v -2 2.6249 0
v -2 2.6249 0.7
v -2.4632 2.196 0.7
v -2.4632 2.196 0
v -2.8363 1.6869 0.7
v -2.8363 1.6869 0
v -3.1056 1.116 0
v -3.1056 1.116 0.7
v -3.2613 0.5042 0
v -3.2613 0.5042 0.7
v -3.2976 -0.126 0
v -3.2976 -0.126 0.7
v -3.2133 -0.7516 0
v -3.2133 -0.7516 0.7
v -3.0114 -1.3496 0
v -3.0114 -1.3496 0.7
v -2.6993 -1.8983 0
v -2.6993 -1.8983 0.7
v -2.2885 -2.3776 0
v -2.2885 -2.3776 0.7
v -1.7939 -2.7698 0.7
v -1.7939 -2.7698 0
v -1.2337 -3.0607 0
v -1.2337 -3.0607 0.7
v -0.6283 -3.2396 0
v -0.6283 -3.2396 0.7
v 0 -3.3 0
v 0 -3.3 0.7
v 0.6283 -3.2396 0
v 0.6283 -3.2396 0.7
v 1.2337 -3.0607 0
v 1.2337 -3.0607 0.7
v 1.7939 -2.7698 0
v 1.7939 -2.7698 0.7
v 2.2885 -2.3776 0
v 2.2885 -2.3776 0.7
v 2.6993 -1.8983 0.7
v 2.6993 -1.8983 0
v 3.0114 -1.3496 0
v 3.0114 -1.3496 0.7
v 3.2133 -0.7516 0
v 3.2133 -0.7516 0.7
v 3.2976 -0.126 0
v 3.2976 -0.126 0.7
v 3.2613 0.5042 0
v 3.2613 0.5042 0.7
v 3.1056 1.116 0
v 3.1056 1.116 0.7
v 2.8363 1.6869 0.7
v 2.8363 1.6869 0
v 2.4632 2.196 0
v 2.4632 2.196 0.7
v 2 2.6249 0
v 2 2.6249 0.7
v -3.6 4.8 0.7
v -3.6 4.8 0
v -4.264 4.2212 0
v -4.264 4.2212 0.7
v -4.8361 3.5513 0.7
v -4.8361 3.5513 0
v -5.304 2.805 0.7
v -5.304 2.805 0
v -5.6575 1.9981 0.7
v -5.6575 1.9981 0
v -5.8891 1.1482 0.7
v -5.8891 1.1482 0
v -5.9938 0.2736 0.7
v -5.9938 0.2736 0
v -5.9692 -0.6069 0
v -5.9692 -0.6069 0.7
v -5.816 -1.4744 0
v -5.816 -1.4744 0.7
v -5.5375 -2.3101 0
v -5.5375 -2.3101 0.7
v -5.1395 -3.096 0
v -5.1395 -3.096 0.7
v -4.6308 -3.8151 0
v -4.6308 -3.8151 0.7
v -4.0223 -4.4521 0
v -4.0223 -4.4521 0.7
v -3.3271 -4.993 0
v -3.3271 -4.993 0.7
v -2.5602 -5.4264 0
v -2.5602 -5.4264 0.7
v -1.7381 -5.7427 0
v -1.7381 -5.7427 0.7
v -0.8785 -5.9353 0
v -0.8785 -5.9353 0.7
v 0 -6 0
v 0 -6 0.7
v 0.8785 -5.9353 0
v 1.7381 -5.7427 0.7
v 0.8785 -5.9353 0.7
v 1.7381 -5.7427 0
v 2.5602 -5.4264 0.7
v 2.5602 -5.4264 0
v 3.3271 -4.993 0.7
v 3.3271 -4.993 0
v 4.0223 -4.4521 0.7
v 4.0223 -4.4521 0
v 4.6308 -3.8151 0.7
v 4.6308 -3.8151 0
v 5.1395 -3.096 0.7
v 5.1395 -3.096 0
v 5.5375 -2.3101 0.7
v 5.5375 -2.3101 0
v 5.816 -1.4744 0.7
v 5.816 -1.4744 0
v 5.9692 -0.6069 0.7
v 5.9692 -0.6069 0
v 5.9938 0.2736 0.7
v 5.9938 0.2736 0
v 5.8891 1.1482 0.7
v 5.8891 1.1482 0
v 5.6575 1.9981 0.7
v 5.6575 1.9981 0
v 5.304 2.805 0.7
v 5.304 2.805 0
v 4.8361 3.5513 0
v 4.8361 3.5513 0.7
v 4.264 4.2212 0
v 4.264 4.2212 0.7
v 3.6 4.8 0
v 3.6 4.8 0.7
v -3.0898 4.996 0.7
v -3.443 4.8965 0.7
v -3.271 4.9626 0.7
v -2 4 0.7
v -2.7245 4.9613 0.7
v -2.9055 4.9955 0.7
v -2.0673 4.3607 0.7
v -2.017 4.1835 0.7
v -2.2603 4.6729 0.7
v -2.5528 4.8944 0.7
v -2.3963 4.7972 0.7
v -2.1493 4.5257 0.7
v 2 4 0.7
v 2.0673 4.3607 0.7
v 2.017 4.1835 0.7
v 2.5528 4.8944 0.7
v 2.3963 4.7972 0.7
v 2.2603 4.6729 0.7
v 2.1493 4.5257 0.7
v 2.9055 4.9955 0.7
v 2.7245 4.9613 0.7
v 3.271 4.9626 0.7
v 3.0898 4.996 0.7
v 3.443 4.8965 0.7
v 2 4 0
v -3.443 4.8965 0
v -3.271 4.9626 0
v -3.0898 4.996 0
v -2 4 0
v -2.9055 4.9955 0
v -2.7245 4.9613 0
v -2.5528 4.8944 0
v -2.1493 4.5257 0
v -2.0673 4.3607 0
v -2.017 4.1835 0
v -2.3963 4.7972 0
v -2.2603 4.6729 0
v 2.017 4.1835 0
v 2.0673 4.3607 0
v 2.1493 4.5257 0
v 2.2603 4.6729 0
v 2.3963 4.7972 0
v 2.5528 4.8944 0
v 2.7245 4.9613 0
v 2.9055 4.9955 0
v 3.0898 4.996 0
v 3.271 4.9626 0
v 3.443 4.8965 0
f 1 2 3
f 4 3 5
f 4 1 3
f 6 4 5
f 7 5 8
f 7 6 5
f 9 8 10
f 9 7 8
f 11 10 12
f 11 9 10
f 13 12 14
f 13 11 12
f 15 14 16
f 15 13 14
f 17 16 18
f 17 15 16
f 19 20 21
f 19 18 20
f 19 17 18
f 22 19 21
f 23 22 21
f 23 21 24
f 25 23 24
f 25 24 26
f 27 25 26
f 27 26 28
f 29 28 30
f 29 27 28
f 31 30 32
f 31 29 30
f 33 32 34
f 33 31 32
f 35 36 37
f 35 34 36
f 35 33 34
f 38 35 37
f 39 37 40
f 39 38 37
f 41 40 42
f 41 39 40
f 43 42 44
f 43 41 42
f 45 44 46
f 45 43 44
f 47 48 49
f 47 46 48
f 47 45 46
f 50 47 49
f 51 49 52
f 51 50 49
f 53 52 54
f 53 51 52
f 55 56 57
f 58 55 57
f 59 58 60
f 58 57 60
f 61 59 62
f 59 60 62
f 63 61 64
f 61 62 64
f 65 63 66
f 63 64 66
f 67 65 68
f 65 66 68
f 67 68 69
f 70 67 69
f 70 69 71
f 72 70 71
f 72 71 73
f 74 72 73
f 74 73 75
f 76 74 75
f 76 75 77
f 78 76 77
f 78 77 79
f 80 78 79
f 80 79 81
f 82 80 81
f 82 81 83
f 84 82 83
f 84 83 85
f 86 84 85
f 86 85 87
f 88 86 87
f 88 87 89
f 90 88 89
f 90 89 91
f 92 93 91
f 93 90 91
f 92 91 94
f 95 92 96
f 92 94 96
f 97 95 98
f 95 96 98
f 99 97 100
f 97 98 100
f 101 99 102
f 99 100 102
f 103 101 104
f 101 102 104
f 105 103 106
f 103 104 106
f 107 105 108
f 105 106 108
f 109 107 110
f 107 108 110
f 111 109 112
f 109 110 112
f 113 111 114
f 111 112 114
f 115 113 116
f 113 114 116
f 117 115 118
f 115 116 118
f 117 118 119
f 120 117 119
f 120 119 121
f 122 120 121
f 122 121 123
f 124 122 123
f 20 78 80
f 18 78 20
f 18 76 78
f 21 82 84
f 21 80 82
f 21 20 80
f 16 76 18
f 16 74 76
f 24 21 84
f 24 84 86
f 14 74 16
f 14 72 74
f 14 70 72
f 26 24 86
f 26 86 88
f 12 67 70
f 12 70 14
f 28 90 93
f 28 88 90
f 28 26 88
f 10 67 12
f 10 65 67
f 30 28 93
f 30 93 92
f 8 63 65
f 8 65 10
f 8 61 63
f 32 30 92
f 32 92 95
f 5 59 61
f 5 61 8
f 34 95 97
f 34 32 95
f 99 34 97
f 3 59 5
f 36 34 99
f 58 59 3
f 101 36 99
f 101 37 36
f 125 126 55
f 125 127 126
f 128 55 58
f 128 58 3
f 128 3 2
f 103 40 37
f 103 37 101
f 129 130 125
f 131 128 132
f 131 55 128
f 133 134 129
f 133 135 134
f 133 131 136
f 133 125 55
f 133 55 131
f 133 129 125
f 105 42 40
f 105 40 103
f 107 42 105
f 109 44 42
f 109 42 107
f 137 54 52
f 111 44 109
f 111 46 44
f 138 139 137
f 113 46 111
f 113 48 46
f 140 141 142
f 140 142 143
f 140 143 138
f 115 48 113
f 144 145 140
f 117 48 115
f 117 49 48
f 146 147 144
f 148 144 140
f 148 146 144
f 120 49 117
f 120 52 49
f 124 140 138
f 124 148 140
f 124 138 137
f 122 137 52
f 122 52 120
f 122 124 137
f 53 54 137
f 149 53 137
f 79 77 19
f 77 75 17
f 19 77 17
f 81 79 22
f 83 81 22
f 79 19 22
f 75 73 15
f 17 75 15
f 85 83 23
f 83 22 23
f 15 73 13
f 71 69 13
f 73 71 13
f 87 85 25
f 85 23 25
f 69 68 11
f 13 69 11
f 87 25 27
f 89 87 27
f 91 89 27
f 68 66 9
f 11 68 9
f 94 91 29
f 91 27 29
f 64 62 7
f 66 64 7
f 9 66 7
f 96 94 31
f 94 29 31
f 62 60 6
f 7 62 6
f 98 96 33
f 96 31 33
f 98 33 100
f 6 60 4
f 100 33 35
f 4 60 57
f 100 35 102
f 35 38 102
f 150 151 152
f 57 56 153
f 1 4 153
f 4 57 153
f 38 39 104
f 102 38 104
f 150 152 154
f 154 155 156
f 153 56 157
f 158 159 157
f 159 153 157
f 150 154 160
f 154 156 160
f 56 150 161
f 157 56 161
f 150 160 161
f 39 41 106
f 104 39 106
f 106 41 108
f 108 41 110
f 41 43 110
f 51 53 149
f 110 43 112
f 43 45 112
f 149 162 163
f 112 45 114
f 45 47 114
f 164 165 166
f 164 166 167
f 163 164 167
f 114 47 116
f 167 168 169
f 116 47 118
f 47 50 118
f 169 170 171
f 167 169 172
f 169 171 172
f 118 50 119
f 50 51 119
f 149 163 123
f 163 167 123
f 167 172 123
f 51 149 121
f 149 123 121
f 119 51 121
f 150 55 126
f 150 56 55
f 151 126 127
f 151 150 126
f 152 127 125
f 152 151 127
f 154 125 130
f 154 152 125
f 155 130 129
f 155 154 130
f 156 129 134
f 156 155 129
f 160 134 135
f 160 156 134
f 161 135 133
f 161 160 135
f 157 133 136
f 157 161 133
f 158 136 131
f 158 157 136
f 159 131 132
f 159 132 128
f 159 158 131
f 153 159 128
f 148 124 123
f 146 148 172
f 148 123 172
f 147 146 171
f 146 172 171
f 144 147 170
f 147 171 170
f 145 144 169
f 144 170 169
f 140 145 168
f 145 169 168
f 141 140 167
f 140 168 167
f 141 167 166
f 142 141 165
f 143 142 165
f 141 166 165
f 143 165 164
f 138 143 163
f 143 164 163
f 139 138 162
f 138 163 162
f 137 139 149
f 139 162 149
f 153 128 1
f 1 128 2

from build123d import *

# Parameters (mm, degrees)
SKETCH1_R           = 6
SKETCH1_R_2         = 3.3
BOSS_EXTRUDE1_DEPTH = 0.7
CUT_EXTRUDE1_DEPTH  = 0.7
FILLET1_R           = 1


with BuildPart() as part:
    # Sketch1 → Boss-Extrude1 (new body)
    with BuildSketch(Plane.XY):
        Circle(SKETCH1_R)
        Circle(SKETCH1_R_2, mode=Mode.SUBTRACT)
    extrude(amount=BOSS_EXTRUDE1_DEPTH)

    # Sketch2 → Cut-Extrude1 (cut)
    with BuildSketch(Plane.XY.offset(0.7)):
        with BuildLine():
            Line((-2, 5.656854249), (-2, 2.62488095))
            Line((-2, 2.62488095), (2, 2.62488095))
            Line((2, 2.62488095), (2, 5.656854249))
            ThreePointArc((2, 5.656854249), (0, 7.656854249), (-2, 5.656854249))
        make_face()
    extrude(amount=-CUT_EXTRUDE1_DEPTH, mode=Mode.SUBTRACT)

    # Fillet1
    fillet1_edges = [part.edges().sort_by_distance(p)[0] for p in [
        (-2, 5.656854249, 0.35),
        (2, 5.656854249, 0.35),
    ]]
    fillet(fillet1_edges, radius=FILLET1_R)


solid = part.part
